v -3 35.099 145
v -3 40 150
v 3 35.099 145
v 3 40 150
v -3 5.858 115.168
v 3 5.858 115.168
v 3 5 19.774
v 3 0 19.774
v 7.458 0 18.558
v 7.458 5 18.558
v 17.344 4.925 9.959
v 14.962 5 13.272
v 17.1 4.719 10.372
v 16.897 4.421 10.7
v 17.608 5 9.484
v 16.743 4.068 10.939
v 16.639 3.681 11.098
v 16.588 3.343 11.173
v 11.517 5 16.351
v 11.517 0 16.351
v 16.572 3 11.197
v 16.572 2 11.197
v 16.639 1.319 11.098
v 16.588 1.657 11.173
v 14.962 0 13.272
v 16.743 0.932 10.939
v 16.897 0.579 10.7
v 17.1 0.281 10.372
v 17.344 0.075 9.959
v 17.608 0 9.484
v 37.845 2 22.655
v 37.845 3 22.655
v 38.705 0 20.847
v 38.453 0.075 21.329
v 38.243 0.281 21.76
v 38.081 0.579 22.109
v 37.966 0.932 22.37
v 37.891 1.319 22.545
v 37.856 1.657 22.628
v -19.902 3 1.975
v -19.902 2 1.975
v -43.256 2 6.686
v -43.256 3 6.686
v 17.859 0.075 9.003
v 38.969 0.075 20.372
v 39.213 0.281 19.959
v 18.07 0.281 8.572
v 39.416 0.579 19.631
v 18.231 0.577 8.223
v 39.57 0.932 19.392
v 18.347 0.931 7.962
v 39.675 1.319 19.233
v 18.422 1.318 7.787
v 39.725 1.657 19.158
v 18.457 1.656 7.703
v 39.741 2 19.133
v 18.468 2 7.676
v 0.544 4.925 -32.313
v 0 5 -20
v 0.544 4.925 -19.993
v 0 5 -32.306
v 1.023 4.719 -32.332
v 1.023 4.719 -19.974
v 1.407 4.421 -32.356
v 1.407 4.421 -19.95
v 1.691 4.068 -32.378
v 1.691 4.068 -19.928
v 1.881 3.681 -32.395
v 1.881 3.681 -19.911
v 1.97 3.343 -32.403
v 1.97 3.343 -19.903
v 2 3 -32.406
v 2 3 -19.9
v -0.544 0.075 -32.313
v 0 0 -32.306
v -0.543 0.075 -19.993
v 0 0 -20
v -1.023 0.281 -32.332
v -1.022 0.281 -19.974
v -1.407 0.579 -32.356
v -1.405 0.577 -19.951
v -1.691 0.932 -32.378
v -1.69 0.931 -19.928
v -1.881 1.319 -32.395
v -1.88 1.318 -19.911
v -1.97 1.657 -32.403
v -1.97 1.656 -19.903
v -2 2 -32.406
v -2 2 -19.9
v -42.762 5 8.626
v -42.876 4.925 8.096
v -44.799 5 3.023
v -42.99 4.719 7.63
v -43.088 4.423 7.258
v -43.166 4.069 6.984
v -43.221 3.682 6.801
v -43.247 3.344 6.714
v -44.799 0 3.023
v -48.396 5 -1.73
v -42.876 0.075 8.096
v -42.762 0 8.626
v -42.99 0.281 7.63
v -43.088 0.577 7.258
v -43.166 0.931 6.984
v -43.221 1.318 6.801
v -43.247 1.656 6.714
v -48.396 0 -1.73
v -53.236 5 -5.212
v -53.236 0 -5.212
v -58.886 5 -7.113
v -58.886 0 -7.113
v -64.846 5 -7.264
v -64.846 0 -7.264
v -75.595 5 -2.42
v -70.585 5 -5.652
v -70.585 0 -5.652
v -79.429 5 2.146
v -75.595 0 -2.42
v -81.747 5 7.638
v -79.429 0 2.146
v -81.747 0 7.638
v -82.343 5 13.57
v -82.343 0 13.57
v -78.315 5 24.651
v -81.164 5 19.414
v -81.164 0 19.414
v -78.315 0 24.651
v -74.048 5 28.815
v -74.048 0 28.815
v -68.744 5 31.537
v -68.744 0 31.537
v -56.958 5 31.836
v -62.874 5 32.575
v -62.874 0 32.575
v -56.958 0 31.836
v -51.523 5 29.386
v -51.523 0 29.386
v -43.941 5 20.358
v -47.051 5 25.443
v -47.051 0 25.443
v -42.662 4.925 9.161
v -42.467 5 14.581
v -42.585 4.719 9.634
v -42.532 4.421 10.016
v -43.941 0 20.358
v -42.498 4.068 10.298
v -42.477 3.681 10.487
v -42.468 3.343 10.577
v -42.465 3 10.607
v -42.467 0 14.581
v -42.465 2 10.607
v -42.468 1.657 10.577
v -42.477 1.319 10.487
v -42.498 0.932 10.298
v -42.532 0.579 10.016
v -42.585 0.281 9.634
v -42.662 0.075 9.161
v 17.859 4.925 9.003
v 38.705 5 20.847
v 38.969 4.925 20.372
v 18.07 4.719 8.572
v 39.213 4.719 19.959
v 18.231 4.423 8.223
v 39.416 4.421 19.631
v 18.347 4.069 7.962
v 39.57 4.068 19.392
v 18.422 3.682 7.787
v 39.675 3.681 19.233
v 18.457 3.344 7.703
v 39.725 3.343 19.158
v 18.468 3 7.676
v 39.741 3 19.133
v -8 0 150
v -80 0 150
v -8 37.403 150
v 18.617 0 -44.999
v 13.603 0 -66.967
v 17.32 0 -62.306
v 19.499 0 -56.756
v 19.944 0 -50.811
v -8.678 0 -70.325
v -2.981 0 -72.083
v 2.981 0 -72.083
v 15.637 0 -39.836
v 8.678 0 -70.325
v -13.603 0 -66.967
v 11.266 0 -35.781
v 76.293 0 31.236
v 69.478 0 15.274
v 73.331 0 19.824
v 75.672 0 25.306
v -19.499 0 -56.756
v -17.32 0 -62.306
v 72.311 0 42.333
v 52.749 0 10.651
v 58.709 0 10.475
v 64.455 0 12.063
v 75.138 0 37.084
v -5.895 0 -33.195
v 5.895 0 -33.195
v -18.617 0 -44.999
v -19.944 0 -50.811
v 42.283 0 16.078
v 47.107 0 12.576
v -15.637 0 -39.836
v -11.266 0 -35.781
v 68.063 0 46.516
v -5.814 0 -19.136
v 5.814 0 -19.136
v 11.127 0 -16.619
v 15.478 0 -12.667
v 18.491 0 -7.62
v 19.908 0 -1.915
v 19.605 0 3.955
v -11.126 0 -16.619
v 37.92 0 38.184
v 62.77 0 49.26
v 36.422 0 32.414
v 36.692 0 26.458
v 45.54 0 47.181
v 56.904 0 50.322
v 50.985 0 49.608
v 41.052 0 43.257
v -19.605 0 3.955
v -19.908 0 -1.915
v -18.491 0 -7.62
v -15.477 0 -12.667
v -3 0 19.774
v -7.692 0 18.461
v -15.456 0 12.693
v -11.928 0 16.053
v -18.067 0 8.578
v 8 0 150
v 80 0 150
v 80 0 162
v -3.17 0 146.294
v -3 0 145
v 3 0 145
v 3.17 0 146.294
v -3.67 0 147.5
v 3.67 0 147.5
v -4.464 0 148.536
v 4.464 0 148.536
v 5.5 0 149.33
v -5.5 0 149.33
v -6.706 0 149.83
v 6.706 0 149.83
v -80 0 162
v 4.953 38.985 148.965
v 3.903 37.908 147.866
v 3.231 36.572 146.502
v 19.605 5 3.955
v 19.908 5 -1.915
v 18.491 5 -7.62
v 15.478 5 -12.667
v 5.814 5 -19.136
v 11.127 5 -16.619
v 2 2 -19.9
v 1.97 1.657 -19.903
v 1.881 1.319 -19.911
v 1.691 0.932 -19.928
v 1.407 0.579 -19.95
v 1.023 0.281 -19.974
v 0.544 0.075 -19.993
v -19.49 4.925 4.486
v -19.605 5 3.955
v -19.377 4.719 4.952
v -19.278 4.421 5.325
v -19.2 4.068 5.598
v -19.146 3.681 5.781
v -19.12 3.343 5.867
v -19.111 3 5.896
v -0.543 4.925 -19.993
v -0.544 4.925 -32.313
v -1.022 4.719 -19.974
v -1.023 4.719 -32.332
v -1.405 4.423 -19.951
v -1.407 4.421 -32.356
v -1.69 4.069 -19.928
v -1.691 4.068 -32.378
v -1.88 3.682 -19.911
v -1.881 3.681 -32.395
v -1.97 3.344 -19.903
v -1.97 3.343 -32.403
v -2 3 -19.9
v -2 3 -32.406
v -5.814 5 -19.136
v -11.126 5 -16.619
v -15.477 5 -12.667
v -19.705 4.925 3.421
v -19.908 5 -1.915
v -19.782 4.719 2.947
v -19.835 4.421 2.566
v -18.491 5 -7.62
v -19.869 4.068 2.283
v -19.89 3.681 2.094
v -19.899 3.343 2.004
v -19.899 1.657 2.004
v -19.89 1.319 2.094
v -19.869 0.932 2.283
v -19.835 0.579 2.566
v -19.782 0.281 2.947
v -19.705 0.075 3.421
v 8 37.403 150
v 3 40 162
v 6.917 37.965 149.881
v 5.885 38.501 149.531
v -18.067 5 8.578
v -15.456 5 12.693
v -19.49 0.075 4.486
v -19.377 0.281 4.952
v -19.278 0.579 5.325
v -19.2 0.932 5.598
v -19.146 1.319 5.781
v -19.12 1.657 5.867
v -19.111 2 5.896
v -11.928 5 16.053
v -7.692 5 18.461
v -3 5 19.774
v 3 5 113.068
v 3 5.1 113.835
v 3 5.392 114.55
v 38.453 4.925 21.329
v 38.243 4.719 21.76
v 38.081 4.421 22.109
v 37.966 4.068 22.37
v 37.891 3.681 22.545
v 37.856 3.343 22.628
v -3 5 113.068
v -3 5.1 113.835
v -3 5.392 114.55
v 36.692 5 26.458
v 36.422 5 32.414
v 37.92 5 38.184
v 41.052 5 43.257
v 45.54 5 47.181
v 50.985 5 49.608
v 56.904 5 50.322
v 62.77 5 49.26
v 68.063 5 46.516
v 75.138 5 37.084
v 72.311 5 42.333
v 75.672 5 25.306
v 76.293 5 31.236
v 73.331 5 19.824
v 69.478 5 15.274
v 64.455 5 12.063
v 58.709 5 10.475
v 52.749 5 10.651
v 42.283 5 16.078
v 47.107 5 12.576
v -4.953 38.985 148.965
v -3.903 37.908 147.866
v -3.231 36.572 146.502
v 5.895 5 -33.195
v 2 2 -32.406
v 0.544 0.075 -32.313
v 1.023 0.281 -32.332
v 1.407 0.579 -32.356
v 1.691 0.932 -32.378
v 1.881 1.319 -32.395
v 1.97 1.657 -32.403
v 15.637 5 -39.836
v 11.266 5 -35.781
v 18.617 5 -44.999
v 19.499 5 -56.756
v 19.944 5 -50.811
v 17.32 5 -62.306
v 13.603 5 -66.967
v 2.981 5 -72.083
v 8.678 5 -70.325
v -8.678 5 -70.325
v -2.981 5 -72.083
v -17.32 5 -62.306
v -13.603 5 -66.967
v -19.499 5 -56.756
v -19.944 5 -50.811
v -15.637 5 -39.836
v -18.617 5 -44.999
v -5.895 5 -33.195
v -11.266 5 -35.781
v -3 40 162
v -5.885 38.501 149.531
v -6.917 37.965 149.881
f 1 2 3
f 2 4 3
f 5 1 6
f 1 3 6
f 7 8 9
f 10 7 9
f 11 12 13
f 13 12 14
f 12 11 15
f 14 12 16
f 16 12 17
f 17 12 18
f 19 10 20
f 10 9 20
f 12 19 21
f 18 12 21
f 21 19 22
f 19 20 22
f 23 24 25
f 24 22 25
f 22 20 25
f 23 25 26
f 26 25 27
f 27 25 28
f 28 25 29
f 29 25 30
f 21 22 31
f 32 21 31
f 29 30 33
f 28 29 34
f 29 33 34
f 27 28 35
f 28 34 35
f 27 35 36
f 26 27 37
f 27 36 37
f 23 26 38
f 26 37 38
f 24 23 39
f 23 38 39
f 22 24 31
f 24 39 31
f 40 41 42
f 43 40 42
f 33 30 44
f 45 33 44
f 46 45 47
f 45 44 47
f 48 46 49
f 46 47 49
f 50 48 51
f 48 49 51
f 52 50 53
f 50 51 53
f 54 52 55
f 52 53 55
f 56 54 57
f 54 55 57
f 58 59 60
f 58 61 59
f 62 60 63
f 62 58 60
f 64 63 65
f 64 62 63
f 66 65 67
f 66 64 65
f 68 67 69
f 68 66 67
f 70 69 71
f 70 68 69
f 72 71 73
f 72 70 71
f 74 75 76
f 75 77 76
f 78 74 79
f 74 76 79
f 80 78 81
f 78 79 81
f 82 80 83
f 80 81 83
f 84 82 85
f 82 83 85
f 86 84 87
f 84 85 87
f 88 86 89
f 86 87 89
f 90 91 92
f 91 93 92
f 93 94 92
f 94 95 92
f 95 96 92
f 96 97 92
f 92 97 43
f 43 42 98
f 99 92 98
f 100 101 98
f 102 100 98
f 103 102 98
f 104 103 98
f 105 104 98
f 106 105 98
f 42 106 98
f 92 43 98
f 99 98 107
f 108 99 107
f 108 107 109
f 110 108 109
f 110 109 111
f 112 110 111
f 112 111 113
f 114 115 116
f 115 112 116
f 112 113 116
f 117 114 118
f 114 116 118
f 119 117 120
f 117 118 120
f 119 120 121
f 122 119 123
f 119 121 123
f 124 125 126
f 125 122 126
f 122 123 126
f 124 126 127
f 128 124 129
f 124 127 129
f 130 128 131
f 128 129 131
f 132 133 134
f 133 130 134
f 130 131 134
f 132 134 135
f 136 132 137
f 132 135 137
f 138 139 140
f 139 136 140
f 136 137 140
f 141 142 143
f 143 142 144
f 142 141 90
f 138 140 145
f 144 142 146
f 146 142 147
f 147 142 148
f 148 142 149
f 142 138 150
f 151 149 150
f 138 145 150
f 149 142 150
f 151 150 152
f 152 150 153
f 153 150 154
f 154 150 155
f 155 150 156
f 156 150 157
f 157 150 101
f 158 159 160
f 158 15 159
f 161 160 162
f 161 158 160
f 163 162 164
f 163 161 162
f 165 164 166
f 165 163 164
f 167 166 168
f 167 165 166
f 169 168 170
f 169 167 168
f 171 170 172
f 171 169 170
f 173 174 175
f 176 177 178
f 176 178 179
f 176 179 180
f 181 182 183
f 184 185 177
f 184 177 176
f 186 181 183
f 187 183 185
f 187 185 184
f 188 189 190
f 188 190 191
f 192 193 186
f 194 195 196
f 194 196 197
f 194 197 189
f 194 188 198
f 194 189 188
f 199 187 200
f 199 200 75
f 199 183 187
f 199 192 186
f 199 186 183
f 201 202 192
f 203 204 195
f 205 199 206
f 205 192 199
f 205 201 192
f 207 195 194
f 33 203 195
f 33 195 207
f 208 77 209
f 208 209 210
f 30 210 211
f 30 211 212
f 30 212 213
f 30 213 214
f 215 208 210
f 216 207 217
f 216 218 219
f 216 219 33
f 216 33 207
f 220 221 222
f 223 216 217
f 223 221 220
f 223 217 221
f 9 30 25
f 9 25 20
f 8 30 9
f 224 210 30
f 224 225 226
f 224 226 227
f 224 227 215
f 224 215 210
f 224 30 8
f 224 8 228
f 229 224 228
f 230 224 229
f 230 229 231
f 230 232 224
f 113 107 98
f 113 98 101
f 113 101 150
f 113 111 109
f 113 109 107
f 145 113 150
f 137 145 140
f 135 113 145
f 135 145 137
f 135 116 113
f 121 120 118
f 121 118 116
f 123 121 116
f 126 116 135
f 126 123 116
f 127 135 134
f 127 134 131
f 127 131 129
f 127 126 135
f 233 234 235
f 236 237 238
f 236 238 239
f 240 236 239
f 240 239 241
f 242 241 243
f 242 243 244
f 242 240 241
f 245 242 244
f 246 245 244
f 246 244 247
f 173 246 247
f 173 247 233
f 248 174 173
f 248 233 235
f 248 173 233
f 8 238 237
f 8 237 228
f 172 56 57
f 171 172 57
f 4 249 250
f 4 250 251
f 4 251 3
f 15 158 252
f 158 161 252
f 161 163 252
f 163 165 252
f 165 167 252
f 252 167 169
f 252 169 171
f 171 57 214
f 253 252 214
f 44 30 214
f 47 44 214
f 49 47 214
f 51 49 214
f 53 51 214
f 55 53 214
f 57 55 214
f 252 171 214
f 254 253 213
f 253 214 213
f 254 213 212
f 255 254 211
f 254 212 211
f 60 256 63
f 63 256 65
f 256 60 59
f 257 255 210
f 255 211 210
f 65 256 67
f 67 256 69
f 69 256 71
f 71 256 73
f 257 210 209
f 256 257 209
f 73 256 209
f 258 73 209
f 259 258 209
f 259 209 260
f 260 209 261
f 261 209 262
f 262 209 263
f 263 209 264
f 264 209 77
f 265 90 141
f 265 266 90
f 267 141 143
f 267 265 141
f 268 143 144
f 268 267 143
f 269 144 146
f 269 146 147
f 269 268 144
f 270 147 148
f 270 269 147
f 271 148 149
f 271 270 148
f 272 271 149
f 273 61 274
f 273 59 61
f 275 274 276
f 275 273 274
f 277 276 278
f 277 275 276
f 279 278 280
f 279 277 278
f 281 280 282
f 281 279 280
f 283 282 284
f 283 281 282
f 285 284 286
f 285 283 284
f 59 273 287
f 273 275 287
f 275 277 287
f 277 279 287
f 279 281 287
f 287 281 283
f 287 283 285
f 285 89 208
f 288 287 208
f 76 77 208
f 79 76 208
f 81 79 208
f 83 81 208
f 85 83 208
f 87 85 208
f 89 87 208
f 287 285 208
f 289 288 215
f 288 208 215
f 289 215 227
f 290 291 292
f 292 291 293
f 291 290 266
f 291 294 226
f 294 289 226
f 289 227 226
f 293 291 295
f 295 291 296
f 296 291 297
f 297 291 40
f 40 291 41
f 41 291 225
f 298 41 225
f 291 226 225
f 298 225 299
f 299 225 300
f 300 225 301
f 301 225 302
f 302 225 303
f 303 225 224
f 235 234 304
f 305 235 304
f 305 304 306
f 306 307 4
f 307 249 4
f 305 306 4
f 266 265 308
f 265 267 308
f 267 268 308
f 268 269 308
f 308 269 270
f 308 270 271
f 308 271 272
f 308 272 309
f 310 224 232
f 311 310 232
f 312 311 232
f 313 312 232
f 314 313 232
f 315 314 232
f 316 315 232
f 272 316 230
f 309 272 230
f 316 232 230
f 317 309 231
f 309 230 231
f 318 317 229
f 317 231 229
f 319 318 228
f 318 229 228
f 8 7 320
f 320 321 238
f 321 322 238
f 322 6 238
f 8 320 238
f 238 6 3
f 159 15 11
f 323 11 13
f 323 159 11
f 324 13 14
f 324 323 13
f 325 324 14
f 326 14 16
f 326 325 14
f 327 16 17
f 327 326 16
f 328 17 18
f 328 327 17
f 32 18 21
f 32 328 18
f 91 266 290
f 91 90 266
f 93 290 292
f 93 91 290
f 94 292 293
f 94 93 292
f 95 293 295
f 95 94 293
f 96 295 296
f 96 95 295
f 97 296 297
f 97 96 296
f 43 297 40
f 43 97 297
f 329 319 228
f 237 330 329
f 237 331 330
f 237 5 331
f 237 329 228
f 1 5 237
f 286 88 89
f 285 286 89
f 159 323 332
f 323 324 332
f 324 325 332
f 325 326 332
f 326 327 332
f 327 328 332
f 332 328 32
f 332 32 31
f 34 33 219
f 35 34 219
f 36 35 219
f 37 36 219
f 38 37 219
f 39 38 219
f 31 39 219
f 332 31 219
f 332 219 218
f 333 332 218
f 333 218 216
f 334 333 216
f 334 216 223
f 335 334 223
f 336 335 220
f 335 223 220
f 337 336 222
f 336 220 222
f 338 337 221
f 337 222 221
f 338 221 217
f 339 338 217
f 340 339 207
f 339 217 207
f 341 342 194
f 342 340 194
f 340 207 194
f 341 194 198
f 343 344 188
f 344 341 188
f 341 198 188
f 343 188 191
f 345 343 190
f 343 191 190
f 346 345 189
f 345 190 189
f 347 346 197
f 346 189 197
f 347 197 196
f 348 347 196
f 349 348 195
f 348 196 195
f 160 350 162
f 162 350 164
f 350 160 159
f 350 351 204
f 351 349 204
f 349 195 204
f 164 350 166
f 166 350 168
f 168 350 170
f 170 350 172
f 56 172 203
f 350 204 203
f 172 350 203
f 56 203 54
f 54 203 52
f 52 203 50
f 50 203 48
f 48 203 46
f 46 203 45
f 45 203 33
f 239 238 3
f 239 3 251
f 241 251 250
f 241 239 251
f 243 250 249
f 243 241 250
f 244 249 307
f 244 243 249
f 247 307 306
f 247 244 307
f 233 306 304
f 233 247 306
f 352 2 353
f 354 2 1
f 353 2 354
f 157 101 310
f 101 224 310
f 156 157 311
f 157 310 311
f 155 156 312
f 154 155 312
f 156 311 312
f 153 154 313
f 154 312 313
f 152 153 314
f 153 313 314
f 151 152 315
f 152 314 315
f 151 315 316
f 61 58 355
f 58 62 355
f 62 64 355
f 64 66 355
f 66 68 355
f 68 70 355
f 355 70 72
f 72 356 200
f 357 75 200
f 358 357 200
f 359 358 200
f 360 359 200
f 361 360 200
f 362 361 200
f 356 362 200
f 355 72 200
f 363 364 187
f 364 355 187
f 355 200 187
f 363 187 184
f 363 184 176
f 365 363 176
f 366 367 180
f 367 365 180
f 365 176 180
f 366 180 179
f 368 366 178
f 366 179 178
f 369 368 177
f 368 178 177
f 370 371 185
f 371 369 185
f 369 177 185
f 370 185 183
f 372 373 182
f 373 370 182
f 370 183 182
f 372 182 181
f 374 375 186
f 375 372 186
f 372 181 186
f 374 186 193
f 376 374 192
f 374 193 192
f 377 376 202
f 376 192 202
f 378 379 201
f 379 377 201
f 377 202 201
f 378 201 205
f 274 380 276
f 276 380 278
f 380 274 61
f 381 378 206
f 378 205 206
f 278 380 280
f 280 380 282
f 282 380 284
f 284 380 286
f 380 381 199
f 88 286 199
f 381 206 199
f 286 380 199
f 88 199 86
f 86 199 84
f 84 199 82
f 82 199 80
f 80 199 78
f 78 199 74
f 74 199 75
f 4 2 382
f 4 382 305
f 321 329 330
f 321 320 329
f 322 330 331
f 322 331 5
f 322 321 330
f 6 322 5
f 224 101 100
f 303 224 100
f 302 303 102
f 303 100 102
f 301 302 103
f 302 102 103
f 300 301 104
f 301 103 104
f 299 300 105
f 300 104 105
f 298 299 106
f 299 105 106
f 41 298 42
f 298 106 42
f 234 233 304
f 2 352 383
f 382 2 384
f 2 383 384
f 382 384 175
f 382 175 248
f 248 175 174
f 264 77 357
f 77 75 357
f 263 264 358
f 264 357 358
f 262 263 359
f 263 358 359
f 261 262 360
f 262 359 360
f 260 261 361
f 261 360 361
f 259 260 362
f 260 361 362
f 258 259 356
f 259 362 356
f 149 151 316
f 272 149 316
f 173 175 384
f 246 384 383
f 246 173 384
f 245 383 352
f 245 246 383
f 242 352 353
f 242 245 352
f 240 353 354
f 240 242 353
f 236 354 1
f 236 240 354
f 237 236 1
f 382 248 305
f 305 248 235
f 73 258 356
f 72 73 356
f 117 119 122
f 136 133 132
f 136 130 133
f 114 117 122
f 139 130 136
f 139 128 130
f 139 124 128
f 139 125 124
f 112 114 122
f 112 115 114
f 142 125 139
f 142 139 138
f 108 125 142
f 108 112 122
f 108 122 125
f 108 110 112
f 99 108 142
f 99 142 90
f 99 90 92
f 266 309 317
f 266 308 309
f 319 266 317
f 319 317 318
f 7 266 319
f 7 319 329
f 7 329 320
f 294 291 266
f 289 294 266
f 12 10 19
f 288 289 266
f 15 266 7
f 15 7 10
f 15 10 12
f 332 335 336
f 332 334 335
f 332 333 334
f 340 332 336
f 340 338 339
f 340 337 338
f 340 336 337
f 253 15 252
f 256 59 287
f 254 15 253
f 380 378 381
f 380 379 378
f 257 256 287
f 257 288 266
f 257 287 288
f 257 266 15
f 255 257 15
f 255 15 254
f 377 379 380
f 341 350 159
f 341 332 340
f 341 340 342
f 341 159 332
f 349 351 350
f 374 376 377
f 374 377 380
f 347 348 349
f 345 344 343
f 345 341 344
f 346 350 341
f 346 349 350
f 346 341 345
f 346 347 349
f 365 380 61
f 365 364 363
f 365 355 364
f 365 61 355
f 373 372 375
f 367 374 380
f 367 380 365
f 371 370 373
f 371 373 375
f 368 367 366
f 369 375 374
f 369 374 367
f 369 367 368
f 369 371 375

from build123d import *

# Parameters (mm, degrees)
BOSS_EXTRUDE1_DEPTH = 5
BOSS_EXTRUDE2_DEPTH = 3
SKETCH3_W           = 160
SKETCH3_H           = 12
BOSS_EXTRUDE3_DEPTH = 35
FILLET5_R           = 3
CUT_EXTRUDE1_DEPTH  = 241.425192154
FILLET12_R          = 5
FILLET13_R          = 2
FILLET14_R          = 2
FILLET15_R          = 2


# Some blends are built 0.0001 mm under size
with BuildPart() as part:
    # Sketch1 → Boss-Extrude1 (new body)
    with BuildSketch(Plane(origin=(0, 0, 0), x_dir=(1, 0, 0), z_dir=(0, 1, 0))):
        with BuildLine():
            Line((-80, -162), (80, -162))
            Line((80, -162), (80, -150))
            Line((80, -150), (3, -150))
            Line((3, -150), (3, -19.773719933))
            ThreePointArc((3, -19.773719933), (10.684156309, -16.90706373), (16.571665535, -11.197316705))
            Line((16.571665535, -11.197316705), (37.844608185, -22.65513623))
            ThreePointArc((37.844608185, -22.65513623), (73.921408989, -39.814809694), (39.741412764, -19.133470092))
            Line((39.741412764, -19.133470092), (18.468470115, -7.675650567))
            ThreePointArc((18.468470115, -7.675650567), (17.170912293, 10.25474383), (2, 19.899748742))
            Line((2, 19.899748742), (2, 32.406243273))
            ThreePointArc((2, 32.406243273), (0, 72.305992015), (-2, 32.406243273))
            Line((-2, 32.406243273), (-2, 19.899748742))
            ThreePointArc((-2, 19.899748742), (-15.477380683, 12.666913088), (-19.902285109, -1.97460058))
            Line((-19.902285109, -1.97460058), (-43.255678368, -6.68568275))
            ThreePointArc((-43.255678368, -6.68568275), (-81.972040815, -16.536227331), (-42.464692112, -10.606695469))
            Line((-42.464692112, -10.606695469), (-19.111298852, -5.895613299))
            ThreePointArc((-19.111298852, -5.895613299), (-13.052886469, -15.153288581), (-3, -19.773719933))
            Line((-3, -19.773719933), (-3, -150))
            Line((-3, -150), (-80, -150))
            Line((-80, -150), (-80, -162))
        make_face()
    extrude(amount=BOSS_EXTRUDE1_DEPTH)

    # Sketch2 → Boss-Extrude2 (add, symmetric)
    with BuildSketch(Plane(origin=(0, 0, 0), x_dir=(0, 0, -1), z_dir=(1, 0, 0))):
        Polygon((-150, 5), (-150, 40), (-114.292857857, 5), align=None)
    extrude(amount=BOSS_EXTRUDE2_DEPTH, both=True)

    # Sketch3 → Boss-Extrude3 (add)
    with BuildSketch(Plane(origin=(0, 5, 0), x_dir=(1, 0, 0), z_dir=(0, 1, 0))):
        with Locations((0, -156)):
            Rectangle(SKETCH3_W, SKETCH3_H)
    extrude(amount=BOSS_EXTRUDE3_DEPTH)

    # Fillet5
    fillet5_edges = [part.edges().sort_by_distance(p)[0] for p in [
        (0, 5, 114.292857857),
    ]]
    fillet(fillet5_edges, radius=FILLET5_R)

    # Sketch4 → Cut-Extrude1 (cut, through all)
    with BuildSketch(Plane(origin=(0, 0, 150), x_dir=(-1, 0, 0), z_dir=(0, 0, -1))):
        Polygon((80, 0), (3, 40), (80, 40), align=None)
        Polygon((-80, 40), (-80, 0), (-3, 40), align=None)
    extrude(amount=-CUT_EXTRUDE1_DEPTH, mode=Mode.SUBTRACT)

    # Fillet12
    # the kernel refuses this fillet: 5 mm, written as the material it adds along each edge
    with BuildSketch(Plane(origin=(-3, 0, 150), x_dir=(0, 0, -1), z_dir=(0, 1, 0))) as fillet12_piece_1_section:
        with BuildLine():
            CenterArc((FILLET12_R, FILLET12_R), FILLET12_R, 180, 90)
            Line((0, FILLET12_R), (0, 0))
            Line((0, 0), (FILLET12_R, 0))
        make_face()
    fillet12_piece_1 = extrude(amount=52.5, mode=Mode.PRIVATE)
    fillet12_piece_1 = split(fillet12_piece_1, bisect_by=Plane(origin=(-4.134914786, 29.296214811, 139.07995488), z_dir=(0, -0.7141428428542851, 0.7)), keep=Keep.TOP, mode=Mode.PRIVATE)
    fillet12_piece_1 = split(fillet12_piece_1, bisect_by=Plane(origin=(-12.366288086, 35.1343958, 148.888985243), z_dir=(0.4609898282276015, -0.8874054193381323, 0)), keep=Keep.TOP, mode=Mode.PRIVATE)
    add(fillet12_piece_1)
    with BuildSketch(Plane(origin=(3, 0, 150), x_dir=(0, 0, -1), z_dir=(0, 1, 0))) as fillet12_piece_2_section:
        with BuildLine():
            CenterArc((FILLET12_R, -FILLET12_R), FILLET12_R, 90, 90)
            Line((0, -FILLET12_R), (0, 0))
            Line((0, 0), (FILLET12_R, 0))
        make_face()
    fillet12_piece_2 = extrude(amount=52.5, mode=Mode.PRIVATE)
    fillet12_piece_2 = split(fillet12_piece_2, bisect_by=Plane(origin=(4.134914786, 29.296214811, 139.07995488), z_dir=(0, -0.7141428428542851, 0.7)), keep=Keep.TOP, mode=Mode.PRIVATE)
    fillet12_piece_2 = split(fillet12_piece_2, bisect_by=Plane(origin=(12.366288086, 35.1343958, 148.888985243), z_dir=(-0.4609898282276015, -0.8874054193381323, 0)), keep=Keep.TOP, mode=Mode.PRIVATE)
    add(fillet12_piece_2)

    # Fillet13
    fillet13_edges = [part.edges().sort_by_distance(p)[0] for p in [
        (-30.787995482, 0, 8.251154384),
        (-31.578981738, 0, 4.330141665),
        (-31.578981738, 5, 4.330141665),
        (-30.787995482, 5, 8.251154384),
    ]]
    fillet(fillet13_edges, radius=FILLET13_R - 0.0001)  # a hair under: the kernel refuses the full size

    # Fillet14
    fillet14_edges = [part.edges().sort_by_distance(p)[0] for p in [
        (27.20813686, 5, 16.926226468),
        (29.104941439, 5, 13.40456033),
        (29.104941439, 0, 13.40456033),
        (27.20813686, 0, 16.926226468),
    ]]
    fillet(fillet14_edges, radius=FILLET14_R - 0.0001)  # a hair under: the kernel refuses the full size

    # Fillet15
    fillet15_edges = [part.edges().sort_by_distance(p)[0] for p in [
        (-2, 0, -26.152996008),
        (2, 0, -26.152996008),
        (2, 5, -26.152996008),
        (-2, 5, -26.152996008),
    ]]
    fillet(fillet15_edges, radius=FILLET15_R - 0.0001)  # a hair under: the kernel refuses the full size


solid = part.part
